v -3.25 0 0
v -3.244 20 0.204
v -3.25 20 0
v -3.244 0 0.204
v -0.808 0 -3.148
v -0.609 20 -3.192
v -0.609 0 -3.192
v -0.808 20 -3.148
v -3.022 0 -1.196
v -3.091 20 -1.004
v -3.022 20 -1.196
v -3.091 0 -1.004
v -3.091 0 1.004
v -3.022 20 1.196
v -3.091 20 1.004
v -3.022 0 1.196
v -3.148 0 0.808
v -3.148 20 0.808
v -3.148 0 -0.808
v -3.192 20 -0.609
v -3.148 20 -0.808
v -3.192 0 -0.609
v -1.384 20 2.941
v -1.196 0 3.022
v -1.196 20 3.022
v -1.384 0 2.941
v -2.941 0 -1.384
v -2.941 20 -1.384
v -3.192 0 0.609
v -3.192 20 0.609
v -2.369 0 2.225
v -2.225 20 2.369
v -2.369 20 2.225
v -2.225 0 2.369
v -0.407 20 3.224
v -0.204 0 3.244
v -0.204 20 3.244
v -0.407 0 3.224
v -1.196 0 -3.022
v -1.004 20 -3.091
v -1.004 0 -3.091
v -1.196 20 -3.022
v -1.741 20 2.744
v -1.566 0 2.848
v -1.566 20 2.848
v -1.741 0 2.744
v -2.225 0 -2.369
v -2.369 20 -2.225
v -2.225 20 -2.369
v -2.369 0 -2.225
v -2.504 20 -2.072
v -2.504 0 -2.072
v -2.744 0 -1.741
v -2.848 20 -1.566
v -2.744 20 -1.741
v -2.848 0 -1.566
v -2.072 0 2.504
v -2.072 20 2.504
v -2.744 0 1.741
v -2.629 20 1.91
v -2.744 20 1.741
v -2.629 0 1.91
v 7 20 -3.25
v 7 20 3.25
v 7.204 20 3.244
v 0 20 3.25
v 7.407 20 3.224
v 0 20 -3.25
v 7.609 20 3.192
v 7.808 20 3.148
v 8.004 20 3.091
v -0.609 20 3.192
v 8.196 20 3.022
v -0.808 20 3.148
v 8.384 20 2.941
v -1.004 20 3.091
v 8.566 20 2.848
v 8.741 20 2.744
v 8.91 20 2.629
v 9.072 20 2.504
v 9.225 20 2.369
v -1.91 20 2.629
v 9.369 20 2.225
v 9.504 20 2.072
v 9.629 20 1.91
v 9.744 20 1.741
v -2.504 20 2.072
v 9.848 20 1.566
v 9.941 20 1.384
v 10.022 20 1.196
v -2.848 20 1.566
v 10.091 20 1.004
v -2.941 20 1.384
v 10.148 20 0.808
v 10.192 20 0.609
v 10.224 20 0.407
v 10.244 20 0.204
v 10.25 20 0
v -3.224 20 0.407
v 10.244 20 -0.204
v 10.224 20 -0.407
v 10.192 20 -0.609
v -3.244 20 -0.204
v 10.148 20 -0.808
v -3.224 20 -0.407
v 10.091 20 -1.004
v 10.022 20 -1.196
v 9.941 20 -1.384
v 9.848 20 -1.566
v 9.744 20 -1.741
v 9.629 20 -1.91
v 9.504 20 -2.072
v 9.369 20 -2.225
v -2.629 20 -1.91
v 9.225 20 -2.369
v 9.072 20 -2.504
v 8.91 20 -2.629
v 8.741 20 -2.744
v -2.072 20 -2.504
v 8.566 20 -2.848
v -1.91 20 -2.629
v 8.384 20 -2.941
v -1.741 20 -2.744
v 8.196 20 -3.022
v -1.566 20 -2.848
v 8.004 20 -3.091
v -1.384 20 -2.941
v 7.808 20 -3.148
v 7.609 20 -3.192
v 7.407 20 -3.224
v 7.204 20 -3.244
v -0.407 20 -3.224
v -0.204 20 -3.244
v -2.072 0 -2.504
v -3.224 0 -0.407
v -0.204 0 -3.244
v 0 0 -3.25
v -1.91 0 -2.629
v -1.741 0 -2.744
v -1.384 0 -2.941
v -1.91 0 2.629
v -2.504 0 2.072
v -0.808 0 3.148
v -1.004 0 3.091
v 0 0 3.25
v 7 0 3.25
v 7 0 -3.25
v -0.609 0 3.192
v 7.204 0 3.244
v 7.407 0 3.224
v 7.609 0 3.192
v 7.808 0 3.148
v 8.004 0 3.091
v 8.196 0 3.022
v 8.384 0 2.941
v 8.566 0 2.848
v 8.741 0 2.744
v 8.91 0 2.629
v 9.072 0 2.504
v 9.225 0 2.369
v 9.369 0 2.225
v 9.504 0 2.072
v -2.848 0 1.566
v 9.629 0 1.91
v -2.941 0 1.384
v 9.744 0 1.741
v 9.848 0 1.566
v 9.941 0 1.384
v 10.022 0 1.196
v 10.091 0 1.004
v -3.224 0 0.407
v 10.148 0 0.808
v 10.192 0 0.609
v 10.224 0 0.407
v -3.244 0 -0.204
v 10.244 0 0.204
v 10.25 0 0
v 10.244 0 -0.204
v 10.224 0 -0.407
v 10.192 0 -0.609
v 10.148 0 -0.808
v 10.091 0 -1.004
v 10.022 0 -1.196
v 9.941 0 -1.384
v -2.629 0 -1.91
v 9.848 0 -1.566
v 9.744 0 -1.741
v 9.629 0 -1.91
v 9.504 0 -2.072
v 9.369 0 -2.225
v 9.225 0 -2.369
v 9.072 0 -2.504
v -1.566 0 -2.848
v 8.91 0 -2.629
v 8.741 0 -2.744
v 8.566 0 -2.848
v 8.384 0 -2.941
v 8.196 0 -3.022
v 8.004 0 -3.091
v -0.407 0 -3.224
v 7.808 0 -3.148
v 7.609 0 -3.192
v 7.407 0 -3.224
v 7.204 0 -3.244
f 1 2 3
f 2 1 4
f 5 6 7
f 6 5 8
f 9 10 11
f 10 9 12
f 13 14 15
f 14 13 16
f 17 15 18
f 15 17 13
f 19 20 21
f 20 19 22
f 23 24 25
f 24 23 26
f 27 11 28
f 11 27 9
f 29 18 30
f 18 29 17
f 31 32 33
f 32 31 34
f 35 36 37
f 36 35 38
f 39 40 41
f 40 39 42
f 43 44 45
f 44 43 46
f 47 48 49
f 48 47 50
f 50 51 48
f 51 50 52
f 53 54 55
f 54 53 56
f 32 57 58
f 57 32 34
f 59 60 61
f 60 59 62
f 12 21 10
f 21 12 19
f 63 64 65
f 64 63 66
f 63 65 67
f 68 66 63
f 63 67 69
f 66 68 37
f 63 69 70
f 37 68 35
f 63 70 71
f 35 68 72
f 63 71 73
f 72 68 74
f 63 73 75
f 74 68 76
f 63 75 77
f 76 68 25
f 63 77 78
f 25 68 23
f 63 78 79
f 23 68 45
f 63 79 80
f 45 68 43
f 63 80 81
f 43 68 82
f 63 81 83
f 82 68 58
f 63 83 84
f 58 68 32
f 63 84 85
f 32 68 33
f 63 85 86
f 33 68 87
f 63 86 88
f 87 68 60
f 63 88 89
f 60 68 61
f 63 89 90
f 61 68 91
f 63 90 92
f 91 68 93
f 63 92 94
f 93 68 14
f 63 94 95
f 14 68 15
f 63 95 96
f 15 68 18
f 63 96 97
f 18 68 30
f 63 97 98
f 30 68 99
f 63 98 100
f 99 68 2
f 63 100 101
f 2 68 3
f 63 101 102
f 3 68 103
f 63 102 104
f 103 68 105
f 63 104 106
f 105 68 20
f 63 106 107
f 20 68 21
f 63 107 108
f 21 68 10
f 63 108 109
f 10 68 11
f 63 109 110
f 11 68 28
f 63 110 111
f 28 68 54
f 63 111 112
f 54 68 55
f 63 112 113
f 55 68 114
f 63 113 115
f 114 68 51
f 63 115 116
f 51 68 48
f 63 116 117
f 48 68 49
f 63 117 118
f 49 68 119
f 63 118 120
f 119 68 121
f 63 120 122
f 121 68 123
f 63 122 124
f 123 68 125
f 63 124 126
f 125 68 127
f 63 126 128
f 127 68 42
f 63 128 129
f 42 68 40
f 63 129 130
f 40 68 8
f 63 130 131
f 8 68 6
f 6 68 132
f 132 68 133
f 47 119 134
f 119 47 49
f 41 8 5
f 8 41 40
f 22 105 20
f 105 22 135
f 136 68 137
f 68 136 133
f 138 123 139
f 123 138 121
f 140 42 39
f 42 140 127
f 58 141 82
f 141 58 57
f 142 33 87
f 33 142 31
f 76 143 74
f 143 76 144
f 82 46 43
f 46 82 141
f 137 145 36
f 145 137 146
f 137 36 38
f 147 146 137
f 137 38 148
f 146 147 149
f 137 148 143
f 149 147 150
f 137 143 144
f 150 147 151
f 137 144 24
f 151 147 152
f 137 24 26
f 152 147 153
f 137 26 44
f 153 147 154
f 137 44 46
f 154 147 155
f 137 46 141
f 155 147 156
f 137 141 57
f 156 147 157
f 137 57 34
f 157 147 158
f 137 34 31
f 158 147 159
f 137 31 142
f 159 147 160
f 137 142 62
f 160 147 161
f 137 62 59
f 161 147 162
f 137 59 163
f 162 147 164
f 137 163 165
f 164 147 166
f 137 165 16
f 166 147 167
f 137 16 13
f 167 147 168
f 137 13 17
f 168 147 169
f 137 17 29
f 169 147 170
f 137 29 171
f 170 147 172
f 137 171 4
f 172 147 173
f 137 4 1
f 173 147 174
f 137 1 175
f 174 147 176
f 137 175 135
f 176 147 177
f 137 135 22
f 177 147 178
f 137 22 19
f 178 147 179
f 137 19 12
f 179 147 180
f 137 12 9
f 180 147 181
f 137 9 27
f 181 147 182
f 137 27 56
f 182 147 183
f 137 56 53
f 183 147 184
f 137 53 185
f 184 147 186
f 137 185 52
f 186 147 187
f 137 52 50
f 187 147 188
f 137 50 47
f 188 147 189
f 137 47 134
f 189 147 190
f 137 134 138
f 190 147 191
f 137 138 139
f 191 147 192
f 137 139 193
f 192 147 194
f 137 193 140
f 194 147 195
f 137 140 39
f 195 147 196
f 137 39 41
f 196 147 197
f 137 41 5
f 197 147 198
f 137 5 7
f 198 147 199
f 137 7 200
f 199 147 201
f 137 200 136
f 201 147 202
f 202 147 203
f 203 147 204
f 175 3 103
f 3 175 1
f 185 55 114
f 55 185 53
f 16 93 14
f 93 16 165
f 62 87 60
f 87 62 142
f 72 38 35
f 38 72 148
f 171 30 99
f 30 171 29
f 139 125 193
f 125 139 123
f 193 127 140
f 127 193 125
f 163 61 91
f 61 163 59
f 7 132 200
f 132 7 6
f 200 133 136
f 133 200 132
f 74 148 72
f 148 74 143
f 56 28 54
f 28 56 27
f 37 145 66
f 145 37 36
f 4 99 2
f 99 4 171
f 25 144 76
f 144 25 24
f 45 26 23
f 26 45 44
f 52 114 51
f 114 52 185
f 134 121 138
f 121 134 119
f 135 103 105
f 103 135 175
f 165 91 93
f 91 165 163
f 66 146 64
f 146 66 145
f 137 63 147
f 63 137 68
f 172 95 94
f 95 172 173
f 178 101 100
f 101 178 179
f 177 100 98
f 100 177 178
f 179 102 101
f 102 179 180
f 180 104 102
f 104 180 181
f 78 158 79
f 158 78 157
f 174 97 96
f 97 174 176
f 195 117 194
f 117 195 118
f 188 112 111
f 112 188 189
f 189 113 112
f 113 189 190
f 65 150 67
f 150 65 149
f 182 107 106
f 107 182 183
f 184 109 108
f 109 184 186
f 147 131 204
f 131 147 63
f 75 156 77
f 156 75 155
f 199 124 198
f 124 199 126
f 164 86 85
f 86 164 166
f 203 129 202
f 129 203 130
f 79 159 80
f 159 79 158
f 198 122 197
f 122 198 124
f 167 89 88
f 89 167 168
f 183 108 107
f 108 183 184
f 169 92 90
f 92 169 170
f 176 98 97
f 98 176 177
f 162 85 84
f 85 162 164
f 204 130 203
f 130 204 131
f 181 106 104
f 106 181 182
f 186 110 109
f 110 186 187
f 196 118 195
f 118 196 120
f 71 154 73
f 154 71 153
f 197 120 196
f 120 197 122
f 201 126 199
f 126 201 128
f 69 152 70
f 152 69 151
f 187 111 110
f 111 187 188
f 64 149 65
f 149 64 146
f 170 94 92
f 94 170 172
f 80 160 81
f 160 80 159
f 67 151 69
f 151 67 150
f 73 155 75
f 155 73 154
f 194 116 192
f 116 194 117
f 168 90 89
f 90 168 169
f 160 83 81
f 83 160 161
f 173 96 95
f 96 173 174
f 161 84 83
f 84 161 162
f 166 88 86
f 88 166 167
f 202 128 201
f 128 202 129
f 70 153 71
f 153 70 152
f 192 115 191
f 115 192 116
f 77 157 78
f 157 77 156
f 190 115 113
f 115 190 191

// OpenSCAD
$fn=100;
function usbc_radius() = 3.25;
function usbc_middle_width() = 6.5;
function usbc_width() = 2 * usbc_radius() + usbc_middle_width();

module usbc_female() {
  // left half cylinder
  rotate([-90,0,0]) cylinder(h=20, r=usbc_radius());

  translate([0,0,-usbc_radius()]) {
    cube([7,20,usbc_middle_width()]);
  }

  // right half cylinder
  translate([7,0,0]) {
    rotate([-90,0,0]) cylinder(h=20, r=usbc_radius());
  }
}

usbc_female();
